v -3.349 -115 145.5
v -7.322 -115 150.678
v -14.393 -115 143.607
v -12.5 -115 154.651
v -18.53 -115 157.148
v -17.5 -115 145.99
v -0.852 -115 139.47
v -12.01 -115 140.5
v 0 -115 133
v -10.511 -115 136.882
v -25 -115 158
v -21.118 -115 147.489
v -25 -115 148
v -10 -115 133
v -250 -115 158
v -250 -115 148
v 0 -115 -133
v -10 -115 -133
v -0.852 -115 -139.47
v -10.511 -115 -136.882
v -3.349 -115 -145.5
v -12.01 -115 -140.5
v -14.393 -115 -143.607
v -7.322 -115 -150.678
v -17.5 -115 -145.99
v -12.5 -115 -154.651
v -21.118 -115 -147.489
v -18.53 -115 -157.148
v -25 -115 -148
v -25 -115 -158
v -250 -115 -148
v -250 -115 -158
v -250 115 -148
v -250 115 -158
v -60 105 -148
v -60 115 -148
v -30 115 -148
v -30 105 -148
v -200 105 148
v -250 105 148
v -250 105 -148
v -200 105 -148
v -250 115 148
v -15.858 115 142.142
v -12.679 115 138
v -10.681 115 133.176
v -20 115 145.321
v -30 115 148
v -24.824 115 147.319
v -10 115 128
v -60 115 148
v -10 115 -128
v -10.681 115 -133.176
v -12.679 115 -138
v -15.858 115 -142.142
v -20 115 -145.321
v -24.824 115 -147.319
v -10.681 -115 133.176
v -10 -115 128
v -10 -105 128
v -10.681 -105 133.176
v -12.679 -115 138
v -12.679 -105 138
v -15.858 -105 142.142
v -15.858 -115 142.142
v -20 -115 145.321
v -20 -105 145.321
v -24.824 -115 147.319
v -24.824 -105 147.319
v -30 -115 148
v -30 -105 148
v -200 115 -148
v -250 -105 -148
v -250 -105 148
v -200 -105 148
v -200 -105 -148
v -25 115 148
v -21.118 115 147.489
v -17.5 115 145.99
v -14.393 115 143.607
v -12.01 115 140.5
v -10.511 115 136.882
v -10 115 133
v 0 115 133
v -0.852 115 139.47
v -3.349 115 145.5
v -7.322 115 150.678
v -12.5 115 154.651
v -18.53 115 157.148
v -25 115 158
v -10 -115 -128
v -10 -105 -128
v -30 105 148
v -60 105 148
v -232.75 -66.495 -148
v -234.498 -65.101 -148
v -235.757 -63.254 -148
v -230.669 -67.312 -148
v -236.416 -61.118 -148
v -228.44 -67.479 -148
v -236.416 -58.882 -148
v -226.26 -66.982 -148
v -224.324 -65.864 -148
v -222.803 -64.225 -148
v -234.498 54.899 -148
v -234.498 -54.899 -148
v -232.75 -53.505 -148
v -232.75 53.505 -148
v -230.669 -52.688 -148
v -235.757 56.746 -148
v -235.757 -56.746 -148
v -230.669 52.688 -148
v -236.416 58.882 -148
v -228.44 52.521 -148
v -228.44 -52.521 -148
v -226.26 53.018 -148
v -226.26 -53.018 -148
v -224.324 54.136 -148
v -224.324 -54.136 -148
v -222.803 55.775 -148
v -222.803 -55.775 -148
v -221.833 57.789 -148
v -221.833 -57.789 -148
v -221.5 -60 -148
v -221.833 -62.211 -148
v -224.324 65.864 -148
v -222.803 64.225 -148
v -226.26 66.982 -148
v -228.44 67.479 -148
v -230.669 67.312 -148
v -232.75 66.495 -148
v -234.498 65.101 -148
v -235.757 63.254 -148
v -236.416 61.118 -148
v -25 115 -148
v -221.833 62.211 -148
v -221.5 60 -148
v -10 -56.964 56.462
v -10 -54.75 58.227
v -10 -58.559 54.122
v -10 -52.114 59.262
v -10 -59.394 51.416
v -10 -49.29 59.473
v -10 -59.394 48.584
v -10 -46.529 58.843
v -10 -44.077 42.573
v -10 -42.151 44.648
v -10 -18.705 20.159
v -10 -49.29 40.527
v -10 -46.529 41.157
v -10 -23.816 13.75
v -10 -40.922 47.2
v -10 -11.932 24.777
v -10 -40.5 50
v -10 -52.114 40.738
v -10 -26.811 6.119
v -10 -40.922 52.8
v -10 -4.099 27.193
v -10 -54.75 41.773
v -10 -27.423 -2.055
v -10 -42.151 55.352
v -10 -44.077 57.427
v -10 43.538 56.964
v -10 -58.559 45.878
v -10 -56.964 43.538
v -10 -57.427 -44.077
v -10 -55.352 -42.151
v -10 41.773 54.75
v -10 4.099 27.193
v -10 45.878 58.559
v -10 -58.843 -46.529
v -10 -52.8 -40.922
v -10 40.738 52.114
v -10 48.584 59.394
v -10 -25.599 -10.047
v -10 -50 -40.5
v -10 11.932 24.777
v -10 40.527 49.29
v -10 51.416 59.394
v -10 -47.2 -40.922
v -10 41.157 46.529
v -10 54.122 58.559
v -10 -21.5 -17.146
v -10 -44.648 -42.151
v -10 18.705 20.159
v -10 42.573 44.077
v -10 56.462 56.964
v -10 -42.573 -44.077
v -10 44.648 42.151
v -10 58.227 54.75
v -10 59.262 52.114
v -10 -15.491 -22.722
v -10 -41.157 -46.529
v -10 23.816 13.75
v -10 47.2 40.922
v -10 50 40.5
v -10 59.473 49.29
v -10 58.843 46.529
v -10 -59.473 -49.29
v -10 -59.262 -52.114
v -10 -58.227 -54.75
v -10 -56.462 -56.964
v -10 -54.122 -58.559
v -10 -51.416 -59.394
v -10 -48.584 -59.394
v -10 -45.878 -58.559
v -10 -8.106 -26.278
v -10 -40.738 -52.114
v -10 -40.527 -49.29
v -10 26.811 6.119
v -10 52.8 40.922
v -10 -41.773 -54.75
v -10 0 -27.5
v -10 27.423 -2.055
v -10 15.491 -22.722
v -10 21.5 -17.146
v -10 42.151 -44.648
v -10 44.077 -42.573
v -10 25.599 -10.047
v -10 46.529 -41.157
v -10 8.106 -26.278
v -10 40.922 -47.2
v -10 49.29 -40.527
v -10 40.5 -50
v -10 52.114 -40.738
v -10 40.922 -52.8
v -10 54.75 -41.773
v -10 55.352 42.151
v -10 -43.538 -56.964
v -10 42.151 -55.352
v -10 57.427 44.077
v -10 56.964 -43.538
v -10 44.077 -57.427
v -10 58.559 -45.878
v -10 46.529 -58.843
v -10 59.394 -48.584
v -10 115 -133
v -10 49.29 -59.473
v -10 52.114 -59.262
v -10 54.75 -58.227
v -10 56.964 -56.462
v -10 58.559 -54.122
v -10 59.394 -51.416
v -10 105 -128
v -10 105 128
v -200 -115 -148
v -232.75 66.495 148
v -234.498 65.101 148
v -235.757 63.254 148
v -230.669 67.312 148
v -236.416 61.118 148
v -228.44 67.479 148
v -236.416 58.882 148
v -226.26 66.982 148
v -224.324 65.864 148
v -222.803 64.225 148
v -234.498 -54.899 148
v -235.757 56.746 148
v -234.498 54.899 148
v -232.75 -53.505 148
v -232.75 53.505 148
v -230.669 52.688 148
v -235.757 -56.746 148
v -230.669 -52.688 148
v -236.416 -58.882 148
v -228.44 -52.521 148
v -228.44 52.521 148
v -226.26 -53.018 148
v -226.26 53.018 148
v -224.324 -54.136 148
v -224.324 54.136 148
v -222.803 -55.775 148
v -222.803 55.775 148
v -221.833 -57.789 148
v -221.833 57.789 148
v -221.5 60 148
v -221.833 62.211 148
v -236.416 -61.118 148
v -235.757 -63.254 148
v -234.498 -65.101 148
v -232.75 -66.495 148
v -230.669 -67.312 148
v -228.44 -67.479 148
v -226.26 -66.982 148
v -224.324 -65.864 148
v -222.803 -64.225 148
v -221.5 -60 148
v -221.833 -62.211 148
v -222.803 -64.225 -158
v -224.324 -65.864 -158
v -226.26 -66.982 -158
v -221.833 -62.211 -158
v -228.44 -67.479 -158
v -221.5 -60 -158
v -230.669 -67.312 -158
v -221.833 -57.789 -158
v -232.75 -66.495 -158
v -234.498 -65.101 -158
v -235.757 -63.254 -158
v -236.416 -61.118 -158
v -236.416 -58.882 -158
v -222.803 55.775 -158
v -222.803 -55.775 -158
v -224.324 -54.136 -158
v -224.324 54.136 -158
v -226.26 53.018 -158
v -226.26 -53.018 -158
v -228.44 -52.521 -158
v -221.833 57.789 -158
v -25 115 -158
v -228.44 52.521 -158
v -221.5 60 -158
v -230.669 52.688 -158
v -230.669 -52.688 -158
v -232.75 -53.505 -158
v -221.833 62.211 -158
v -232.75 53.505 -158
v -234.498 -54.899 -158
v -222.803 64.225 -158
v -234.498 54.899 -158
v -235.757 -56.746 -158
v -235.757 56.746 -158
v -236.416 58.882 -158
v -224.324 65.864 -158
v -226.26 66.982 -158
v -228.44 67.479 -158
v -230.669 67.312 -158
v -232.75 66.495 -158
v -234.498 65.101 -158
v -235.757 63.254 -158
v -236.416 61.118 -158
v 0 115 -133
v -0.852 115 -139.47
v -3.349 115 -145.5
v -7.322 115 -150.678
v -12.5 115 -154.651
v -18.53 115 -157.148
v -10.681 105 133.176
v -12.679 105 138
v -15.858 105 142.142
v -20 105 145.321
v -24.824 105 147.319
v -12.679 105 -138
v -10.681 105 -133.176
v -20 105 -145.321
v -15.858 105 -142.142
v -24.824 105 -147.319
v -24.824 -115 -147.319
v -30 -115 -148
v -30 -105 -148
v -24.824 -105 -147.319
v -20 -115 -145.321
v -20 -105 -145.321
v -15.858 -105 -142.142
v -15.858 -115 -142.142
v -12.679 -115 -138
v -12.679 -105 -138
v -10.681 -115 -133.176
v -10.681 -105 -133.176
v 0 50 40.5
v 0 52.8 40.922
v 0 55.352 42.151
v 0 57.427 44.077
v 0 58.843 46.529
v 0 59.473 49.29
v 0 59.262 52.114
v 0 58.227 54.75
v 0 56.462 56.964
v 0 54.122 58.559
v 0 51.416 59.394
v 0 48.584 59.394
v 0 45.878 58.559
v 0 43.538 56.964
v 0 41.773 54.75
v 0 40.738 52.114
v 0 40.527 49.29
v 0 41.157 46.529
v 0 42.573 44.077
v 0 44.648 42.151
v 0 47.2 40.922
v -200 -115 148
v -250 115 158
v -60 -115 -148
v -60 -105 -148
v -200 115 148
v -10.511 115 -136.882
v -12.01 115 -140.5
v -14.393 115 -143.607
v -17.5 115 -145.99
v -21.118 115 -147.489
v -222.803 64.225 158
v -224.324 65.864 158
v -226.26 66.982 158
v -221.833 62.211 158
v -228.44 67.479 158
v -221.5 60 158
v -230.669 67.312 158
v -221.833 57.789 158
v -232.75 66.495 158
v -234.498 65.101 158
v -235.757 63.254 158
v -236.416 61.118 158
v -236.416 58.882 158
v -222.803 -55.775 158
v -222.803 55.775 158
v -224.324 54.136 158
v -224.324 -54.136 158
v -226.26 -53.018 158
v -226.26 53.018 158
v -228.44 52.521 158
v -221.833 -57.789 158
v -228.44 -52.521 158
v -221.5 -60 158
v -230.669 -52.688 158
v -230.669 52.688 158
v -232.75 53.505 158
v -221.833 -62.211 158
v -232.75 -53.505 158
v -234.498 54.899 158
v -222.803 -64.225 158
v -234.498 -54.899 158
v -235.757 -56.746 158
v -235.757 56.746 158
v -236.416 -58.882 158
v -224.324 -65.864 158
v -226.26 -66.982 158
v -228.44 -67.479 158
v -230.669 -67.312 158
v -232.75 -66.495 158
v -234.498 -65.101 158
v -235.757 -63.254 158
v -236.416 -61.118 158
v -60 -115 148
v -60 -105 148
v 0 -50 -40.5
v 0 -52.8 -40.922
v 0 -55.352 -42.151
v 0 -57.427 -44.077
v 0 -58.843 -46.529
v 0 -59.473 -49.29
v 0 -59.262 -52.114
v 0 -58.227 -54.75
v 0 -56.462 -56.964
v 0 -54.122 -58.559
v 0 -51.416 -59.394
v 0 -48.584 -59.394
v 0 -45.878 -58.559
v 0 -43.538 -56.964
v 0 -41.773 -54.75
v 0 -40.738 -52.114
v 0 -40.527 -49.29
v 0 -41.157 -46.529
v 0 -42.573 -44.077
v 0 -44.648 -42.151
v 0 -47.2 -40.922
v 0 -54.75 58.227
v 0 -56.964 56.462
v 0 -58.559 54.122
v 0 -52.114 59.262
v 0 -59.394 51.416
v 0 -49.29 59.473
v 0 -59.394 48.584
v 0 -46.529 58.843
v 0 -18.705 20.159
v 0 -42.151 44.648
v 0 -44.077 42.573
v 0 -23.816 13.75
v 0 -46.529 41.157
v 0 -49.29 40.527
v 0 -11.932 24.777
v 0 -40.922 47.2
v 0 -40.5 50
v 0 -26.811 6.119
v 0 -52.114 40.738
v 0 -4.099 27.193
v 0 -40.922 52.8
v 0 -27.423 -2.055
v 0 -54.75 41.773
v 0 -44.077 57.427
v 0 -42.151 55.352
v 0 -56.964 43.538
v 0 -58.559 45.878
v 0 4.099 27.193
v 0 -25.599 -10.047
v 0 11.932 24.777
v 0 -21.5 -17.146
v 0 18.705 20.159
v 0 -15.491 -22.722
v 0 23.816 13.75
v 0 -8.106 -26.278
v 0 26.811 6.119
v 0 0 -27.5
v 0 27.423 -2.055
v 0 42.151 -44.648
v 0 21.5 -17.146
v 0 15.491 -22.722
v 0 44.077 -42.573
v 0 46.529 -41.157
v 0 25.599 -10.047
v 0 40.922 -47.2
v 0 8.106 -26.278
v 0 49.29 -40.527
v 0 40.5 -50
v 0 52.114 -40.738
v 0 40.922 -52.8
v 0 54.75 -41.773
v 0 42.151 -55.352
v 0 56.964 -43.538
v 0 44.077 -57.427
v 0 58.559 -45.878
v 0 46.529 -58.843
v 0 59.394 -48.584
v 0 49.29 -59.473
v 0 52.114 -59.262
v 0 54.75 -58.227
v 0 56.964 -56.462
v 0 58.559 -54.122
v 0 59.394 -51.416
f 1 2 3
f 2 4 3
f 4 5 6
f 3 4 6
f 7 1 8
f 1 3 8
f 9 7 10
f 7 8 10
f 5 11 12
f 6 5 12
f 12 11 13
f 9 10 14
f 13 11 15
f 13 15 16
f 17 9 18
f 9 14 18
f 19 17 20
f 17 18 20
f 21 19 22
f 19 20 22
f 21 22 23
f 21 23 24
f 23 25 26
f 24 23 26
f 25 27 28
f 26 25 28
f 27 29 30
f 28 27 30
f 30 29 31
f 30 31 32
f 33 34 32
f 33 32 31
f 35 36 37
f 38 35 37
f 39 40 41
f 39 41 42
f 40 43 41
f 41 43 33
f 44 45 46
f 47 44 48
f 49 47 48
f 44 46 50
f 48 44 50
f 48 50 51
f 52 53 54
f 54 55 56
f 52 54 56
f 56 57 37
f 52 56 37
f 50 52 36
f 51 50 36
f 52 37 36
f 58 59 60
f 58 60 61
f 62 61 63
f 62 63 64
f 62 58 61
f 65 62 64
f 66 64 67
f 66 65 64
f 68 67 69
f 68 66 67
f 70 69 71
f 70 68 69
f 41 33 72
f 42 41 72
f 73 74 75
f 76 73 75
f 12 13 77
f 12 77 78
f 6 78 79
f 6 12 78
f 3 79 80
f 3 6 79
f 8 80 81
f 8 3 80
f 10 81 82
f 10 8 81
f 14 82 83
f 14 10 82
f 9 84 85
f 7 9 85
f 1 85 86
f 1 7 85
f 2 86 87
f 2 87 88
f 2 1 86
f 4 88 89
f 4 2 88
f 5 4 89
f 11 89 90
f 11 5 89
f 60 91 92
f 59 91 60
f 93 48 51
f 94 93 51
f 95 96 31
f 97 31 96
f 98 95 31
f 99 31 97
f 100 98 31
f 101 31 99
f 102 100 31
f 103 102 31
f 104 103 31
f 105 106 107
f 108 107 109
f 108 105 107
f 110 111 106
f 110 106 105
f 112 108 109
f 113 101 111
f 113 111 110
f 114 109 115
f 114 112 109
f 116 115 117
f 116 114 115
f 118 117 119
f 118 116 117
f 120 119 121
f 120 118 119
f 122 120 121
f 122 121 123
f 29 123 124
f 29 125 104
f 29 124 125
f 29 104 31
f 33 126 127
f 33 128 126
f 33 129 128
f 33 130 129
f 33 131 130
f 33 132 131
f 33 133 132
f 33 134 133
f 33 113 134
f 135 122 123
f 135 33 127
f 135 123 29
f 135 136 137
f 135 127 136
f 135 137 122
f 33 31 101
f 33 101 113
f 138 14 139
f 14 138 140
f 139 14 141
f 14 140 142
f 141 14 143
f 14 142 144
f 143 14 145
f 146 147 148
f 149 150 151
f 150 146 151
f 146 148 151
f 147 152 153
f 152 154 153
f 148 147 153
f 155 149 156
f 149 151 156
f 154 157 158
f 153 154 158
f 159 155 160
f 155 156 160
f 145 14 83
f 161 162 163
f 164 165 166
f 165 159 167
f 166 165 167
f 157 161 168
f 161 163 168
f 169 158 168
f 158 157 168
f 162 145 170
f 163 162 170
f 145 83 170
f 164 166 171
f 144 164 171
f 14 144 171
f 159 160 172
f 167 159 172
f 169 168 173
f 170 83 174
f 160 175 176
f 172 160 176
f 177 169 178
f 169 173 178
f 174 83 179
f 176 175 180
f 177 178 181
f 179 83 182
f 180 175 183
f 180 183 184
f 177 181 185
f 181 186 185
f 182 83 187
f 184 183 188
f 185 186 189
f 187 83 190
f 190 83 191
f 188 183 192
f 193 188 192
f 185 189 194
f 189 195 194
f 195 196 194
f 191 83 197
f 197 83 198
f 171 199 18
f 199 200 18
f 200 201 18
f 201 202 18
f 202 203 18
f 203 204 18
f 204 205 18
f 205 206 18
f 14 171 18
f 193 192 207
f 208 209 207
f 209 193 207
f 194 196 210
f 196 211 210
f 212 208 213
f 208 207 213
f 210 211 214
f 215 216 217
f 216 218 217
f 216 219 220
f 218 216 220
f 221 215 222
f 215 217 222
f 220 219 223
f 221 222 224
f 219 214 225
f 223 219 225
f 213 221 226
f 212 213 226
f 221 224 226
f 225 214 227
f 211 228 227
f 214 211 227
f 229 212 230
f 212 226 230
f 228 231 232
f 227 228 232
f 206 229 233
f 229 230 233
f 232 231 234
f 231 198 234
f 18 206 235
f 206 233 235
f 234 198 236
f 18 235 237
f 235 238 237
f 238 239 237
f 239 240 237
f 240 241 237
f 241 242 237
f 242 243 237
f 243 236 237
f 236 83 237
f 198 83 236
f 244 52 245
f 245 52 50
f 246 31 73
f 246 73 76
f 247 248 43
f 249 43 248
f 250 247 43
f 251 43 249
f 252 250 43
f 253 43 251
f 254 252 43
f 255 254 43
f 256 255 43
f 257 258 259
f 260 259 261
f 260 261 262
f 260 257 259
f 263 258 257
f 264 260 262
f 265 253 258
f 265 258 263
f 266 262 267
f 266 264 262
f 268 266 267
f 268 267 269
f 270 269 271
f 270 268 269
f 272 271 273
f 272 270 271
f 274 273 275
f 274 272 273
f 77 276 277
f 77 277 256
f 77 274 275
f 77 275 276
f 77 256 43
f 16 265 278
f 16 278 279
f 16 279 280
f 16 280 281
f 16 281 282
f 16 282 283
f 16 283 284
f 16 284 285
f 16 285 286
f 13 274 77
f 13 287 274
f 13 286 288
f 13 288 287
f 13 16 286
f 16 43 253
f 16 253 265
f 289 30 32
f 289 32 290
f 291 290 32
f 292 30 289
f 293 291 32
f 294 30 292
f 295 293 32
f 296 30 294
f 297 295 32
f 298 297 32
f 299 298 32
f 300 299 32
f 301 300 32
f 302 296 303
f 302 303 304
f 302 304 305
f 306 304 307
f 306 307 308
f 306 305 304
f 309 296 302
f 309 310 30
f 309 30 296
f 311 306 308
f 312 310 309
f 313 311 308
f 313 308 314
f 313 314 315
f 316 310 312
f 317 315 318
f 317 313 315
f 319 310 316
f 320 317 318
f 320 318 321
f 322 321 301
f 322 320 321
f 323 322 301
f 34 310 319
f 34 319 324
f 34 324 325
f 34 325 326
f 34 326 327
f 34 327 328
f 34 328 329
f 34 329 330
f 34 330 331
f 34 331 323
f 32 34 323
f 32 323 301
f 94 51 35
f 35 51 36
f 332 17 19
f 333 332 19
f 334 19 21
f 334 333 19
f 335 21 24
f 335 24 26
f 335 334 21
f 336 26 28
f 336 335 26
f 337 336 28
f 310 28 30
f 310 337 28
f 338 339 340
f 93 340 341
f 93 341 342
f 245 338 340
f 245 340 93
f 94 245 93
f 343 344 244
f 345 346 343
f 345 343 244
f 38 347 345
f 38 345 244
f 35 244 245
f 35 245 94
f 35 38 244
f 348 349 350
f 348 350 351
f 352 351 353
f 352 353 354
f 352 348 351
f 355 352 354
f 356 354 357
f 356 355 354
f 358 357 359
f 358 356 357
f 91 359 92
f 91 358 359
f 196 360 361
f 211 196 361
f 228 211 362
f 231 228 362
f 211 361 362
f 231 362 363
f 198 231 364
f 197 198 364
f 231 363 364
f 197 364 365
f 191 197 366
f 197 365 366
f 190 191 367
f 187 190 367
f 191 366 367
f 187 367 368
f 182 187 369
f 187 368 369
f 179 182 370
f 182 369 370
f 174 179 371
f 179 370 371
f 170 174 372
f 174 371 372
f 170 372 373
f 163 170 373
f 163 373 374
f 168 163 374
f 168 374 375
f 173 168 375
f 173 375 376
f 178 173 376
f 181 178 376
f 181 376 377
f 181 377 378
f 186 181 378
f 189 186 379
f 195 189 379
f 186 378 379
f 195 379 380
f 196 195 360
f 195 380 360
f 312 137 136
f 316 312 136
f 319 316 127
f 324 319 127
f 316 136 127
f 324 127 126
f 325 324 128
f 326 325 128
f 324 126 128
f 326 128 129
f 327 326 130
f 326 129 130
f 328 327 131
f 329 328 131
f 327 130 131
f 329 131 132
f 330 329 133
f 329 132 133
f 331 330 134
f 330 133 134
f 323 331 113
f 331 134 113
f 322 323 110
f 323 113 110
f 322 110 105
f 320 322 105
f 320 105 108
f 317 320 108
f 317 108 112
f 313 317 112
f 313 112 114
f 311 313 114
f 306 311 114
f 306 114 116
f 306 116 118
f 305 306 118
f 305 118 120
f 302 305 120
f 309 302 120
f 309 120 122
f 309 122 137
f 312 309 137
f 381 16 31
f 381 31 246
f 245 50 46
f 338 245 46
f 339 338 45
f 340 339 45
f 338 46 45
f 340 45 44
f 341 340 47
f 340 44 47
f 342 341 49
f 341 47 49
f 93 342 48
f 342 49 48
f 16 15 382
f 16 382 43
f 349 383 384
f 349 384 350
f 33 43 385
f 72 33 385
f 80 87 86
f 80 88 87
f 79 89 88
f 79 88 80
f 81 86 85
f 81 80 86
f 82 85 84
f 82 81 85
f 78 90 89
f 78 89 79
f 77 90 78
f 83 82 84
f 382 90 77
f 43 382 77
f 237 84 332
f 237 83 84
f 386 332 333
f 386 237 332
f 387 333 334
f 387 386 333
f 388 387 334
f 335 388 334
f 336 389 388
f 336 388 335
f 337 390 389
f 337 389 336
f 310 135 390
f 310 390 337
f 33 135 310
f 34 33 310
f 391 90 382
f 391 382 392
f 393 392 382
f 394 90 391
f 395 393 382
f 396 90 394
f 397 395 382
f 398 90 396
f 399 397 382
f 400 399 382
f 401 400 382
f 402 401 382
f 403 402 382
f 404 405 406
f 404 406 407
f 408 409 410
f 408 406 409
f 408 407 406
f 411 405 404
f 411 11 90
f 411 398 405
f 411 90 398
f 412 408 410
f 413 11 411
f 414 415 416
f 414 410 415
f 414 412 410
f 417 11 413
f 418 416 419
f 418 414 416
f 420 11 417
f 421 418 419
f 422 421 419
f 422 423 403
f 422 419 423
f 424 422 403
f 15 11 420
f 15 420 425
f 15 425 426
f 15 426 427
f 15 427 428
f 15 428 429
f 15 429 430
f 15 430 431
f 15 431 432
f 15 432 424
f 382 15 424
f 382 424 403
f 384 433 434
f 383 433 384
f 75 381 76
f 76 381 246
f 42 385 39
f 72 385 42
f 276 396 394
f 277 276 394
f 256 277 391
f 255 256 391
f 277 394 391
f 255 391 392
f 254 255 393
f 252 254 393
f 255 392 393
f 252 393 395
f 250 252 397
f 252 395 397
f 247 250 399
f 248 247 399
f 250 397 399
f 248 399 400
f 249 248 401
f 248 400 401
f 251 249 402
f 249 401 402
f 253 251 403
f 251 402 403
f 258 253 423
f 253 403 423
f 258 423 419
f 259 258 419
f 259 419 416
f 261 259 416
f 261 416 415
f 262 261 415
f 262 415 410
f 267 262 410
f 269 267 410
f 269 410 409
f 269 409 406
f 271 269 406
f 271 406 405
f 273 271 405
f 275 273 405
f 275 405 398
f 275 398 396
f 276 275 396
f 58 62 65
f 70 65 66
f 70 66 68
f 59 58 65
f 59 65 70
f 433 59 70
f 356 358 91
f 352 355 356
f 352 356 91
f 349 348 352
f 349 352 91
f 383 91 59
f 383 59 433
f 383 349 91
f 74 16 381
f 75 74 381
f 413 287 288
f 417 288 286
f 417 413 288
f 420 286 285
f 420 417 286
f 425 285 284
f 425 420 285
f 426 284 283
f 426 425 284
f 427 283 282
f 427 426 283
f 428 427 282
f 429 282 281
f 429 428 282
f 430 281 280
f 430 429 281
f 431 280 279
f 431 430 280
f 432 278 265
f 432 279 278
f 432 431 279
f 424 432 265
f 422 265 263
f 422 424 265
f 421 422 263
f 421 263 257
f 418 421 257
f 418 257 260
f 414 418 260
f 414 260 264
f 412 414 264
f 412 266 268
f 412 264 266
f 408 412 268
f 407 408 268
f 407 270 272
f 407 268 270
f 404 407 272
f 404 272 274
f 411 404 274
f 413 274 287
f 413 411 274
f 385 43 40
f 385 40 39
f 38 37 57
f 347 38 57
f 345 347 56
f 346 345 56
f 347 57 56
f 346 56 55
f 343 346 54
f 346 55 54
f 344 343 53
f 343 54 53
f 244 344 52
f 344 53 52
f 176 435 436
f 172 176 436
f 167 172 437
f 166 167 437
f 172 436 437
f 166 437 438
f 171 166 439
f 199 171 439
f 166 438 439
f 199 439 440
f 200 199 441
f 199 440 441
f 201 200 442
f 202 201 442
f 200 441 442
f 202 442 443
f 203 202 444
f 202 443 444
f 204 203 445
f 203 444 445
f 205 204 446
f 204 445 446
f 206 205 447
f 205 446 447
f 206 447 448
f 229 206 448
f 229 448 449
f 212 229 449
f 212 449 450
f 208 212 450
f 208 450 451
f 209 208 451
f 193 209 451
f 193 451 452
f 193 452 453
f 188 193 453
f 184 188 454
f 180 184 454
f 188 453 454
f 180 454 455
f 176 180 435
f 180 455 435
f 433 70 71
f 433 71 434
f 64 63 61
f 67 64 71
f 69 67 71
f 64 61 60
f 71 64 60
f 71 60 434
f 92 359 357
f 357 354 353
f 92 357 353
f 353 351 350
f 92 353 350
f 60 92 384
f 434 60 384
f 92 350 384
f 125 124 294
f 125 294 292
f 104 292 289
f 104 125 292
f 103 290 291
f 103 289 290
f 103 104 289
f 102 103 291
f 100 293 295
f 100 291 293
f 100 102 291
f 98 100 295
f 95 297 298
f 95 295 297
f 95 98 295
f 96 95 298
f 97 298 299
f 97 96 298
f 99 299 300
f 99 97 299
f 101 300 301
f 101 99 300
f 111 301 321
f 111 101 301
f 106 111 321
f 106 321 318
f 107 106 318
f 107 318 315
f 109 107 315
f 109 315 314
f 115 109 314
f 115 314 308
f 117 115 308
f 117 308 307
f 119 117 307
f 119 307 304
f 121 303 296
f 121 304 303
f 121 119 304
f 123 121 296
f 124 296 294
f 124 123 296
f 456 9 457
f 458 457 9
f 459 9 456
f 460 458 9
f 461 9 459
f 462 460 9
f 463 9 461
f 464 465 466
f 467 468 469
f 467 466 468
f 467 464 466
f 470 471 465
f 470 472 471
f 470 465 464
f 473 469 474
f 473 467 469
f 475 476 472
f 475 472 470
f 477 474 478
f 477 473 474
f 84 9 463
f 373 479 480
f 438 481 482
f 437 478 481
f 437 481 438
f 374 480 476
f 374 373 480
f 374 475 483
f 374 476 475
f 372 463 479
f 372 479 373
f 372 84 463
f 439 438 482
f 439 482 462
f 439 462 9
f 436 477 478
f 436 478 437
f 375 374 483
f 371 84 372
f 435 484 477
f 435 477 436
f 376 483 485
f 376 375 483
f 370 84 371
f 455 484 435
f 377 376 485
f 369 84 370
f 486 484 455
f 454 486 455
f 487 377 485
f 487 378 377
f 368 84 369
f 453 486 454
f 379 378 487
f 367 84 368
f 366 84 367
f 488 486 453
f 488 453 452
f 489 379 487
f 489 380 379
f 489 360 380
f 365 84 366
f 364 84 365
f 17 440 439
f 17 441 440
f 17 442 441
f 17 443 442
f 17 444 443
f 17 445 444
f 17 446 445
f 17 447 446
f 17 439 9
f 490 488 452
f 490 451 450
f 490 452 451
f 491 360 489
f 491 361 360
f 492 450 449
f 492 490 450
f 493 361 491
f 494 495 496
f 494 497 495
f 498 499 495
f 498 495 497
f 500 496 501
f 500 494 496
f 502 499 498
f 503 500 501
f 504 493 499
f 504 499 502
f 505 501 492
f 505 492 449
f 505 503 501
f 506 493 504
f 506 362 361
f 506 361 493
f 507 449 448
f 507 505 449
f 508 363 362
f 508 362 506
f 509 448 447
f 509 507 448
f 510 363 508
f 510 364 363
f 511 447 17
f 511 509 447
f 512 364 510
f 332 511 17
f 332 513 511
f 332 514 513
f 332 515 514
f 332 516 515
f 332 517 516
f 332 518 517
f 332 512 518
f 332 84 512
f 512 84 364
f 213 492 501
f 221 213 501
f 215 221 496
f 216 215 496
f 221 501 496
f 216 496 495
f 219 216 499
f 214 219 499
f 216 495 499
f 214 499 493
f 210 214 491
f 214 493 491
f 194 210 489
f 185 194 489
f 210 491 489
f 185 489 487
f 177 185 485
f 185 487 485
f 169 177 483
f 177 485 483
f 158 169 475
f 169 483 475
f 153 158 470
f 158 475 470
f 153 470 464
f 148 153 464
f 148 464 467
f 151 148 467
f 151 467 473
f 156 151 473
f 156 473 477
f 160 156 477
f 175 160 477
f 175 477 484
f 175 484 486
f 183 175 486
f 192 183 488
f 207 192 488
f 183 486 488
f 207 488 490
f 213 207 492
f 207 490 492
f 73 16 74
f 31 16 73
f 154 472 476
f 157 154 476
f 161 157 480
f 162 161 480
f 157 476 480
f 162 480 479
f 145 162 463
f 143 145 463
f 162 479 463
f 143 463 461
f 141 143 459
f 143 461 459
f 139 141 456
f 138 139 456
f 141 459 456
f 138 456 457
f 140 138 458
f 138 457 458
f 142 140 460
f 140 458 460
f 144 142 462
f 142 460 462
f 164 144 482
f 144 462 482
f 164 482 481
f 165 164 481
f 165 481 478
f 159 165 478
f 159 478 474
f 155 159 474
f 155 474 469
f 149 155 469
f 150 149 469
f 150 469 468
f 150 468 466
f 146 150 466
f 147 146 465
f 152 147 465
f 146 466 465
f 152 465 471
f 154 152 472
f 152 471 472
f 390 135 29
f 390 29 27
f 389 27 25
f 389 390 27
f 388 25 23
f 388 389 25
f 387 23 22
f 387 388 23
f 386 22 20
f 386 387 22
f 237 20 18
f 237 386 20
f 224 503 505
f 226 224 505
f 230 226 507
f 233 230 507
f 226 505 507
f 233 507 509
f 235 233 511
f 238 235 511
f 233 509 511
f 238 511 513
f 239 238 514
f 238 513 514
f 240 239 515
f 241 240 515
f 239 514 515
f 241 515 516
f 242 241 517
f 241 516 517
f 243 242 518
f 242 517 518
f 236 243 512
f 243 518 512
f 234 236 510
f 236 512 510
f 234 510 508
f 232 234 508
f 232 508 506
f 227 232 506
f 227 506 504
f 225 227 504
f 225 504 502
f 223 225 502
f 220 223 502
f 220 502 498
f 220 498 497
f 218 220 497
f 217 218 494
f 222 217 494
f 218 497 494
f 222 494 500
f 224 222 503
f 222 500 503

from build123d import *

# Parameters (mm, degrees)
SKETCH1_W                      = 316
SKETCH1_H                      = 230
BASE_FLANGE1_DEPTH             = 10
EDGE_FLANGE1_STRIP_W           = 70
EDGE_FLANGE1_STRIP_H           = 10
EDGE_FLANGE1_STRIP_CUT_DEPTH   = 230
EDGE_FLANGE1_STRIP_2_W         = 70
EDGE_FLANGE1_STRIP_2_H         = 10
EDGE_FLANGE1_STRIP_CUT_2_DEPTH = 230
EDGE_FLANGE1_DEPTH             = 230
EDGE_FLANGE1_BEND_DEPTH        = 230
SKETCH12_R                     = 27.5
CUT_EXTRUDE1_DEPTH             = 10
SKETCH13_R                     = 7.5
CUT_EXTRUDE2_DEPTH             = 420.023865669
SKETCH14_R                     = 9.5
CUT_EXTRUDE3_DEPTH             = 10
BOSS_EXTRUDE1_DEPTH            = 10
SKETCH15_W                     = 50
SKETCH15_H                     = 296
BOSS_EXTRUDE1_2_DEPTH          = 10
CIRPATTERN1_COUNT              = 4


# Sheet-metal steps are written as plain solids
with BuildPart() as part:
    # Sketch1 → Base-Flange1 (new body)
    with BuildSketch(Plane(origin=(0, 0, 0), x_dir=(0, 0, -1), z_dir=(1, 0, 0))):
        Rectangle(SKETCH1_W, SKETCH1_H)
    extrude(amount=-BASE_FLANGE1_DEPTH)

    # Edge-Flange1 strip (across the edge) → Edge-Flange1 strip cut (cut)
    with BuildSketch(Plane(origin=(-10, -115, 158), x_dir=(0, 0, -1), z_dir=(0, 1, 0))):
        with Locations((-10, -5)):
            Rectangle(EDGE_FLANGE1_STRIP_W, EDGE_FLANGE1_STRIP_H)
    extrude(amount=EDGE_FLANGE1_STRIP_CUT_DEPTH, mode=Mode.SUBTRACT)

    # Edge-Flange1 strip 2 (across the edge) → Edge-Flange1 strip cut 2 (cut)
    with BuildSketch(Plane(origin=(-10, 115, -158), x_dir=(0, 0, 1), z_dir=(0, -1, 0))):
        with Locations((-10, -5)):
            Rectangle(EDGE_FLANGE1_STRIP_2_W, EDGE_FLANGE1_STRIP_2_H)
    extrude(amount=EDGE_FLANGE1_STRIP_CUT_2_DEPTH, mode=Mode.SUBTRACT)

    # Edge-Flange1 section (across the edge) → Edge-Flange1 (add)
    with BuildSketch(Plane(origin=(-10, -115, 158), x_dir=(0, 0, -1), z_dir=(0, 1, 0))):
        with BuildLine():
            Line((0, 15), (0, 240))
            Line((0, 240), (10, 240))
            Line((10, 240), (10, 15))
            ThreePointArc((10, 15), (14.393398282, 4.393398282), (25, 0))
            Line((25, 0), (25, -10))
            ThreePointArc((25, -10), (7.32233047, -2.67766953), (0, 15))
        make_face()
    extrude(amount=EDGE_FLANGE1_DEPTH)

    # Edge-Flange1 section 2 (across the edge) → Edge-Flange1 bend (add)
    with BuildSketch(Plane(origin=(-10, 115, -158), x_dir=(0, 0, 1), z_dir=(0, -1, 0))):
        with BuildLine():
            Line((0, 15), (0, 240))
            Line((0, 240), (10, 240))
            Line((10, 240), (10, 15))
            ThreePointArc((10, 15), (14.393398282, 4.393398282), (25, 0))
            Line((25, 0), (25, -10))
            ThreePointArc((25, -10), (7.32233047, -2.67766953), (0, 15))
        make_face()
    extrude(amount=EDGE_FLANGE1_BEND_DEPTH)

    # Sketch12 → Cut-Extrude1 (cut)
    with BuildSketch(Plane(origin=(0, 0, 0), x_dir=(0, 0, -1), z_dir=(1, 0, 0))):
        Circle(SKETCH12_R)
    extrude(amount=-CUT_EXTRUDE1_DEPTH, mode=Mode.SUBTRACT)

    # Sketch13 → Cut-Extrude2 (cut, through all)
    with BuildSketch(Plane.XY.offset(158)):
        with Locations((-229, 60)):
            Circle(SKETCH13_R)
    cut_extrude2 = extrude(amount=-CUT_EXTRUDE2_DEPTH, mode=Mode.SUBTRACT)

    # Sketch14 → Cut-Extrude3 (cut)
    with BuildSketch(Plane(origin=(0, 0, 0), x_dir=(0, 0, -1), z_dir=(1, 0, 0))):
        with Locations((-50, 50)):
            Circle(SKETCH14_R)
    cut_extrude3 = extrude(amount=-CUT_EXTRUDE3_DEPTH, mode=Mode.SUBTRACT)

    # Mirror1: Cut-Extrude2 across plane
    add(cut_extrude2.mirror(Plane.ZX), mode=Mode.SUBTRACT)

    # CirPattern1: Cut-Extrude3 ×4 about axis
    cirpattern1_axis = Axis((0, 0, 0), (1, 0, 0))
    for i in range(1, CIRPATTERN1_COUNT):
        add(cut_extrude3.rotate(cirpattern1_axis, i * 360 / CIRPATTERN1_COUNT), mode=Mode.SUBTRACT)


with BuildPart() as body_2:
    # Sketch15 → Boss-Extrude1 (new body)
    with BuildSketch(Plane(origin=(0, 115, 0), x_dir=(1, 0, 0), z_dir=(0, 1, 0))):
        with BuildLine():
            Line((-60, 148), (-30, 148))
            ThreePointArc((-30, 148), (-15.857864376, 142.142135624), (-10, 128))
            Line((-10, 128), (-10, -128))
            ThreePointArc((-10, -128), (-15.857864376, -142.142135624), (-30, -148))
            Line((-30, -148), (-60, -148))
            Line((-60, -148), (-60, 148))
        make_face()
    extrude(amount=-BOSS_EXTRUDE1_DEPTH)


with BuildPart() as body_3:
    # Sketch15 → Boss-Extrude1 2 (new body)
    with BuildSketch(Plane(origin=(0, 115, 0), x_dir=(1, 0, 0), z_dir=(0, 1, 0))):
        with Locations((-225, 0)):
            Rectangle(SKETCH15_W, SKETCH15_H)
    extrude(amount=-BOSS_EXTRUDE1_2_DEPTH)


with BuildPart() as body_4:
    # Mirror2: mirrored copy
    add(body_2.part.mirror(Plane.ZX))


with BuildPart() as body_5:
    # Mirror2 2: mirrored copy
    add(body_3.part.mirror(Plane.ZX))


solid = Compound([part.part, body_2.part, body_3.part, body_4.part, body_5.part])
